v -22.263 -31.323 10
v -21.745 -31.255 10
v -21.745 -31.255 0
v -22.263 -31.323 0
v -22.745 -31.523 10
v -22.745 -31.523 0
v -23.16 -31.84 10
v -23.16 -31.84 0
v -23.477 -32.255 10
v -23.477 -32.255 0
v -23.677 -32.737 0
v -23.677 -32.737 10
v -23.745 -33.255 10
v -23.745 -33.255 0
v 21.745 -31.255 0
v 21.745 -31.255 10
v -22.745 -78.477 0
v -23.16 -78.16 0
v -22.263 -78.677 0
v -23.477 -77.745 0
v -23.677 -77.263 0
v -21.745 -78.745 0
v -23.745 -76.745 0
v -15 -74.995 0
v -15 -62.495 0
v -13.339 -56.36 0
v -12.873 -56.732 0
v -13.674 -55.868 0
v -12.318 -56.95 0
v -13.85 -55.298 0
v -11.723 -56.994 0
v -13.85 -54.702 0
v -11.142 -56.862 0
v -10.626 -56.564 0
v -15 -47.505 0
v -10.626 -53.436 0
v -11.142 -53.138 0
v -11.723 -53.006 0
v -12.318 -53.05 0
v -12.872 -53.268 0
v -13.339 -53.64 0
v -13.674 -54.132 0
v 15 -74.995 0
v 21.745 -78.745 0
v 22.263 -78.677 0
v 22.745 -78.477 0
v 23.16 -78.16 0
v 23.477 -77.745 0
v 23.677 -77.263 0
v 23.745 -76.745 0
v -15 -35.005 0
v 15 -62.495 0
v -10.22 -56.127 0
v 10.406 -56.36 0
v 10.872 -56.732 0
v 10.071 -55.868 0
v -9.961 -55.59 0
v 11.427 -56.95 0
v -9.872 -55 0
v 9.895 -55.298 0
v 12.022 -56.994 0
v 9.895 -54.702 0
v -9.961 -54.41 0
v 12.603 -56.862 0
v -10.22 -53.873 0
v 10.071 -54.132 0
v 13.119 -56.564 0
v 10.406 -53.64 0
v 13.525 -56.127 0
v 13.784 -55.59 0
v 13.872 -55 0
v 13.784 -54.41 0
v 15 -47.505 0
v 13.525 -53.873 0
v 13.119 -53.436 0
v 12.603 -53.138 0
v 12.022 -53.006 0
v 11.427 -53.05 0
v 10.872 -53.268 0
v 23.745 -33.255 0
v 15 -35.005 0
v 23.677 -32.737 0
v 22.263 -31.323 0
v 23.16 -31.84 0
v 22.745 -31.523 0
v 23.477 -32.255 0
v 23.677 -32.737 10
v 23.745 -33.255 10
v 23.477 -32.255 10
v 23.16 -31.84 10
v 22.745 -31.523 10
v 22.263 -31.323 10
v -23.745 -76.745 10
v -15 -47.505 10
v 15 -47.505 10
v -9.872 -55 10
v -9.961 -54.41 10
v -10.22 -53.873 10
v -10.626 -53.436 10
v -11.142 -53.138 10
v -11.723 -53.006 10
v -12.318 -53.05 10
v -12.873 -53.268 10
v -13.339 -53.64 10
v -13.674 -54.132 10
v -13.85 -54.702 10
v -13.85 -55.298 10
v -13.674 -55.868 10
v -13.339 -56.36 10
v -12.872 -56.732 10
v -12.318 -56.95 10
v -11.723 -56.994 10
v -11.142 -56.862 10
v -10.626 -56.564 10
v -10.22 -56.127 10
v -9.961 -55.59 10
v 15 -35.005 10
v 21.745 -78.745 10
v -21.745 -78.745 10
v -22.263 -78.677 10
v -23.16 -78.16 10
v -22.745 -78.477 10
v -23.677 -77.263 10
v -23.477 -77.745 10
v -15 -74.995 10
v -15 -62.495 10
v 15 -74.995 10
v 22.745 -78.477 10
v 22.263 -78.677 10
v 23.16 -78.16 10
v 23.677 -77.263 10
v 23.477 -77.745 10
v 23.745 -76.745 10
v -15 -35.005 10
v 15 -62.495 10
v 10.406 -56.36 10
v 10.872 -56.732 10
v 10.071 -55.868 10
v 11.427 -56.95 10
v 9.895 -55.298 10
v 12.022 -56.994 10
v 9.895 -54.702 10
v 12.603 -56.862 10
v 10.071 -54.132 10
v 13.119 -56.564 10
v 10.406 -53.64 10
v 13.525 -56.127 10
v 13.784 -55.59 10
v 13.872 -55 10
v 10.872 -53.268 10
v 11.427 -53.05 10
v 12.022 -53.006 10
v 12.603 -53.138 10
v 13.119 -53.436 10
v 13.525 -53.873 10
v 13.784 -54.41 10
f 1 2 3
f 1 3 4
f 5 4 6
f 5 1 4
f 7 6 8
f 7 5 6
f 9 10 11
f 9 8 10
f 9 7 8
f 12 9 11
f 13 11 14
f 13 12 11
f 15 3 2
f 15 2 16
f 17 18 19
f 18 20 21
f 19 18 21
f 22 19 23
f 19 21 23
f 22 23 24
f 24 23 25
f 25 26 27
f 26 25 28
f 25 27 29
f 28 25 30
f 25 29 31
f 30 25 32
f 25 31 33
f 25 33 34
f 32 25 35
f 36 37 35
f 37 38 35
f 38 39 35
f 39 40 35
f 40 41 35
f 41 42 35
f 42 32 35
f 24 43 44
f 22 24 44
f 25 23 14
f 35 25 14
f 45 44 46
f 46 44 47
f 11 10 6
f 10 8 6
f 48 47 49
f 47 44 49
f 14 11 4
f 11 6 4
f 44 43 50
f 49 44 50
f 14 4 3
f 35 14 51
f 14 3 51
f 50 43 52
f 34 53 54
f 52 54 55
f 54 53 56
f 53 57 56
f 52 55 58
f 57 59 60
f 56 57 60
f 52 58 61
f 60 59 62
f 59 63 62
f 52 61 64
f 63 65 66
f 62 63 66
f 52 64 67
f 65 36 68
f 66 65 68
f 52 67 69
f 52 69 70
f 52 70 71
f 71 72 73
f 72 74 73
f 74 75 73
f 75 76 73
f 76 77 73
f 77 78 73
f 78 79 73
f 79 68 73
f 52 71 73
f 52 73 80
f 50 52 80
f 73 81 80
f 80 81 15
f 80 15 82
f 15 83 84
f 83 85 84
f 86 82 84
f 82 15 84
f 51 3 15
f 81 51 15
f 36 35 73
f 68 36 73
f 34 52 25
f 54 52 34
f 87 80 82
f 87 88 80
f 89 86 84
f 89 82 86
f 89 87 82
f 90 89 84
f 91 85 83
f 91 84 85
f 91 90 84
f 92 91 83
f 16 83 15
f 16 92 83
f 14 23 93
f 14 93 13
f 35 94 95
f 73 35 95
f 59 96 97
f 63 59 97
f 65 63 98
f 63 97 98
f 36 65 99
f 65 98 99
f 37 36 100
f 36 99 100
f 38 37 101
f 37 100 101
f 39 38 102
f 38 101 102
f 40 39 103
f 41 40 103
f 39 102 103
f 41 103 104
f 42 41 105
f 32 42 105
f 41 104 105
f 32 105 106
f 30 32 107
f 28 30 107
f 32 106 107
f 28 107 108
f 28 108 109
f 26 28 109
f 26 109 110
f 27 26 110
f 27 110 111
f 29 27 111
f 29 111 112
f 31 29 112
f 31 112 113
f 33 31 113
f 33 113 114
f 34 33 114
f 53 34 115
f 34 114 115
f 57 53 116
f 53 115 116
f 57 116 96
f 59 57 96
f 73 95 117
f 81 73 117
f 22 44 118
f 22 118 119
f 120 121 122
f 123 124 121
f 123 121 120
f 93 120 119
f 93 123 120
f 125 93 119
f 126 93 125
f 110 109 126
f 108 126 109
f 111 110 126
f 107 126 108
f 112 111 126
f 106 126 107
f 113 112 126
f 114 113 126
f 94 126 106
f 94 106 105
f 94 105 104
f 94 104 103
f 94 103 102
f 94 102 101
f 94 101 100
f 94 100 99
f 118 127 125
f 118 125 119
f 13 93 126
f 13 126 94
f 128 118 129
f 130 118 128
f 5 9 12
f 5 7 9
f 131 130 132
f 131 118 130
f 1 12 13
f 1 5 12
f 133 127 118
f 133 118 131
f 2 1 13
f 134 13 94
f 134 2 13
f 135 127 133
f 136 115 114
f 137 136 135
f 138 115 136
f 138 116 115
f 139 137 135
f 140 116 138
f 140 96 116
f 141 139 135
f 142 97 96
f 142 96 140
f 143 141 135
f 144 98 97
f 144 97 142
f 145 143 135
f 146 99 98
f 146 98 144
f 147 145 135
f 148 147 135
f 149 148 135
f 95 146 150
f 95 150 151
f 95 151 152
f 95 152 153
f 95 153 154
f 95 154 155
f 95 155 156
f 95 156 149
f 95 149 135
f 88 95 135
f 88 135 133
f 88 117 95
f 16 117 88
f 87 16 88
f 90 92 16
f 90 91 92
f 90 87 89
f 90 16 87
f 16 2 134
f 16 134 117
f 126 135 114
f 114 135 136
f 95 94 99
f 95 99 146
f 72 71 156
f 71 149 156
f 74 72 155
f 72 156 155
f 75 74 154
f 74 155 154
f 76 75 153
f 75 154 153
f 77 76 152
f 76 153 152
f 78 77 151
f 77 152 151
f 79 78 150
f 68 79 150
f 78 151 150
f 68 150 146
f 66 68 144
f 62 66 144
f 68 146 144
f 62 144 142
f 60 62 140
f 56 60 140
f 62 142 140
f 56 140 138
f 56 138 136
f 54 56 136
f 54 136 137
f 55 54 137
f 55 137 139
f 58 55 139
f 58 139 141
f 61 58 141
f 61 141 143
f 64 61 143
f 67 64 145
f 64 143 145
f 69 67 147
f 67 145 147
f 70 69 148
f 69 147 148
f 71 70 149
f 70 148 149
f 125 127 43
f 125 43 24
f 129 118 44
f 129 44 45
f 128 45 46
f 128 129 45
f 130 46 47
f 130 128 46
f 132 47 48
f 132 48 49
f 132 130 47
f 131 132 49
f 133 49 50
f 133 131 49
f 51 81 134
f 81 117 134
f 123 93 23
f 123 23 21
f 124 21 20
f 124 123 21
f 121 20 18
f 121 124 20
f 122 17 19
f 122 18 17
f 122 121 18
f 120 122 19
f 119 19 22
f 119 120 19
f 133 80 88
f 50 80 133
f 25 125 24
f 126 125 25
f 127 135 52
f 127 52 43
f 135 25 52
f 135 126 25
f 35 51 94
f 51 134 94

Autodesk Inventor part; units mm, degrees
ref_plane "YZ Plane" through (0, 0, 0) normal (1, 0, 0) x (0, 1, 0)
ref_plane "XZ Plane" through (0, 0, 0) normal (0, 1, 0) x (-1, 0, 0)
ref_plane "XY Plane" through (0, 0, 0) normal (0, 0, 1) x (1, 0, 0)
ref_plane "РабПлоскость1" through (0, 0, 0) normal (0, 0, 1) x (1, 0, 0)
sketch "Эскиз1" plane through (0, 0, 0) normal (0, 0, 1) x (1, 0, 0)
  line L0 (-20, -75) -> (20, -35) construction
  line L1 (20, -75) -> (-20, -35) construction
  line L2 (51, -62.7546) -> (51, 0.2454) projected
  line L3 (-51, 0.2454) -> (-51, -62.7546) projected
  line L4 (23.7454, -78.7454) -> (-23.7454, -78.7454)
  line L5 (-23.7454, -78.7454) -> (-23.7454, -31.2546)
  line L6 (-23.7454, -31.2546) -> (23.7454, -31.2546)
  line L7 (23.7454, -31.2546) -> (23.7454, -78.7454)
  line L8 (23.7454, -78.7454) -> (-23.7454, -31.2546) construction
  line L9 (-23.7454, -78.7454) -> (23.7454, -31.2546) construction
  point P0 (0, 0)
  point P1 (0, -55)
  point P2 (0, -55)
  dimension "d0" = 40
  dimension "d1" = 40
  dimension "d2" = 55
  dimension "d3" = 51
extrude "Выдавливание1" add sketch "Эскиз1" along normal blind 10
fillet "Сопряжение1" radius 2 4 edges at (-23.7454, -78.7454, 5) (23.7454, -78.7454, 5) (23.7454, -31.2546, 5) (-23.7454, -31.2546, 5)
sketch "Эскиз2" plane through (0, 0, 10) normal (0, 0, 1) x (1, 0, 0)
  line L0 (21.7454, -31.2546) -> (-21.7454, -31.2546) projected
  line L1 (0, -31.2546) -> (0, -78.7454)
  line L2 (-21.7454, -78.7454) -> (21.7454, -78.7454) projected
  line L3 (-23.7454, -33.2546) -> (-23.7454, -76.7454) projected
  line L4 (-23.7454, -55) -> (23.7454, -55)
  line L5 (23.7454, -76.7454) -> (23.7454, -33.2546) projected
  line L6 (0, -55) -> (-11.8725, -55)
  circle A0 centre (-11.8725, -55) radius 2
  circle A1 centre (11.8725, -55) radius 2
  point P0 (0, 0)
  dimension "d7" = 11.8725
  dimension "d8" = 4
extrude "Выдавливание2" cut sketch "Эскиз2" against normal blind 10
sketch "Эскиз3" plane through (0, 0, 10) normal (0, 0, 1) x (1, 0, 0)
  line L0 (-21.7454, -78.7454) -> (21.7454, -78.7454) projected
  line L1 (0, -78.7454) -> (0, -31.2546)
  line L2 (21.7454, -31.2546) -> (-21.7454, -31.2546) projected
  line L3 (-23.7454, -33.2546) -> (-23.7454, -76.7454) projected
  line L4 (-23.7454, -55) -> (23.7454, -55)
  line L5 (23.7454, -76.7454) -> (23.7454, -33.2546) projected
  line L6 (15, -74.9954) -> (-15, -74.9954)
  line L7 (-15, -74.9954) -> (-15, -62.4954)
  line L8 (-15, -62.4954) -> (15, -62.4954)
  line L9 (15, -62.4954) -> (15, -74.9954)
  line L10 (15, -74.9954) -> (-15, -62.4954) construction
  line L11 (-15, -74.9954) -> (15, -62.4954) construction
  line L12 (-21.7454, -78.7454) -> (21.7454, -78.7454) projected
  line L13 (15, -35.0046) -> (-15, -35.0046)
  line L14 (-15, -35.0046) -> (-15, -47.5046)
  line L15 (-15, -47.5046) -> (15, -47.5046)
  line L16 (15, -47.5046) -> (15, -35.0046)
  point P0 (0, 0)
  point P1 (0, -68.7454)
  dimension "d11" = 30
  dimension "d12" = 12.5
  dimension "d13" = 10
extrude "Выдавливание3" cut sketch "Эскиз3" against normal blind 10
properties part number "голова"
